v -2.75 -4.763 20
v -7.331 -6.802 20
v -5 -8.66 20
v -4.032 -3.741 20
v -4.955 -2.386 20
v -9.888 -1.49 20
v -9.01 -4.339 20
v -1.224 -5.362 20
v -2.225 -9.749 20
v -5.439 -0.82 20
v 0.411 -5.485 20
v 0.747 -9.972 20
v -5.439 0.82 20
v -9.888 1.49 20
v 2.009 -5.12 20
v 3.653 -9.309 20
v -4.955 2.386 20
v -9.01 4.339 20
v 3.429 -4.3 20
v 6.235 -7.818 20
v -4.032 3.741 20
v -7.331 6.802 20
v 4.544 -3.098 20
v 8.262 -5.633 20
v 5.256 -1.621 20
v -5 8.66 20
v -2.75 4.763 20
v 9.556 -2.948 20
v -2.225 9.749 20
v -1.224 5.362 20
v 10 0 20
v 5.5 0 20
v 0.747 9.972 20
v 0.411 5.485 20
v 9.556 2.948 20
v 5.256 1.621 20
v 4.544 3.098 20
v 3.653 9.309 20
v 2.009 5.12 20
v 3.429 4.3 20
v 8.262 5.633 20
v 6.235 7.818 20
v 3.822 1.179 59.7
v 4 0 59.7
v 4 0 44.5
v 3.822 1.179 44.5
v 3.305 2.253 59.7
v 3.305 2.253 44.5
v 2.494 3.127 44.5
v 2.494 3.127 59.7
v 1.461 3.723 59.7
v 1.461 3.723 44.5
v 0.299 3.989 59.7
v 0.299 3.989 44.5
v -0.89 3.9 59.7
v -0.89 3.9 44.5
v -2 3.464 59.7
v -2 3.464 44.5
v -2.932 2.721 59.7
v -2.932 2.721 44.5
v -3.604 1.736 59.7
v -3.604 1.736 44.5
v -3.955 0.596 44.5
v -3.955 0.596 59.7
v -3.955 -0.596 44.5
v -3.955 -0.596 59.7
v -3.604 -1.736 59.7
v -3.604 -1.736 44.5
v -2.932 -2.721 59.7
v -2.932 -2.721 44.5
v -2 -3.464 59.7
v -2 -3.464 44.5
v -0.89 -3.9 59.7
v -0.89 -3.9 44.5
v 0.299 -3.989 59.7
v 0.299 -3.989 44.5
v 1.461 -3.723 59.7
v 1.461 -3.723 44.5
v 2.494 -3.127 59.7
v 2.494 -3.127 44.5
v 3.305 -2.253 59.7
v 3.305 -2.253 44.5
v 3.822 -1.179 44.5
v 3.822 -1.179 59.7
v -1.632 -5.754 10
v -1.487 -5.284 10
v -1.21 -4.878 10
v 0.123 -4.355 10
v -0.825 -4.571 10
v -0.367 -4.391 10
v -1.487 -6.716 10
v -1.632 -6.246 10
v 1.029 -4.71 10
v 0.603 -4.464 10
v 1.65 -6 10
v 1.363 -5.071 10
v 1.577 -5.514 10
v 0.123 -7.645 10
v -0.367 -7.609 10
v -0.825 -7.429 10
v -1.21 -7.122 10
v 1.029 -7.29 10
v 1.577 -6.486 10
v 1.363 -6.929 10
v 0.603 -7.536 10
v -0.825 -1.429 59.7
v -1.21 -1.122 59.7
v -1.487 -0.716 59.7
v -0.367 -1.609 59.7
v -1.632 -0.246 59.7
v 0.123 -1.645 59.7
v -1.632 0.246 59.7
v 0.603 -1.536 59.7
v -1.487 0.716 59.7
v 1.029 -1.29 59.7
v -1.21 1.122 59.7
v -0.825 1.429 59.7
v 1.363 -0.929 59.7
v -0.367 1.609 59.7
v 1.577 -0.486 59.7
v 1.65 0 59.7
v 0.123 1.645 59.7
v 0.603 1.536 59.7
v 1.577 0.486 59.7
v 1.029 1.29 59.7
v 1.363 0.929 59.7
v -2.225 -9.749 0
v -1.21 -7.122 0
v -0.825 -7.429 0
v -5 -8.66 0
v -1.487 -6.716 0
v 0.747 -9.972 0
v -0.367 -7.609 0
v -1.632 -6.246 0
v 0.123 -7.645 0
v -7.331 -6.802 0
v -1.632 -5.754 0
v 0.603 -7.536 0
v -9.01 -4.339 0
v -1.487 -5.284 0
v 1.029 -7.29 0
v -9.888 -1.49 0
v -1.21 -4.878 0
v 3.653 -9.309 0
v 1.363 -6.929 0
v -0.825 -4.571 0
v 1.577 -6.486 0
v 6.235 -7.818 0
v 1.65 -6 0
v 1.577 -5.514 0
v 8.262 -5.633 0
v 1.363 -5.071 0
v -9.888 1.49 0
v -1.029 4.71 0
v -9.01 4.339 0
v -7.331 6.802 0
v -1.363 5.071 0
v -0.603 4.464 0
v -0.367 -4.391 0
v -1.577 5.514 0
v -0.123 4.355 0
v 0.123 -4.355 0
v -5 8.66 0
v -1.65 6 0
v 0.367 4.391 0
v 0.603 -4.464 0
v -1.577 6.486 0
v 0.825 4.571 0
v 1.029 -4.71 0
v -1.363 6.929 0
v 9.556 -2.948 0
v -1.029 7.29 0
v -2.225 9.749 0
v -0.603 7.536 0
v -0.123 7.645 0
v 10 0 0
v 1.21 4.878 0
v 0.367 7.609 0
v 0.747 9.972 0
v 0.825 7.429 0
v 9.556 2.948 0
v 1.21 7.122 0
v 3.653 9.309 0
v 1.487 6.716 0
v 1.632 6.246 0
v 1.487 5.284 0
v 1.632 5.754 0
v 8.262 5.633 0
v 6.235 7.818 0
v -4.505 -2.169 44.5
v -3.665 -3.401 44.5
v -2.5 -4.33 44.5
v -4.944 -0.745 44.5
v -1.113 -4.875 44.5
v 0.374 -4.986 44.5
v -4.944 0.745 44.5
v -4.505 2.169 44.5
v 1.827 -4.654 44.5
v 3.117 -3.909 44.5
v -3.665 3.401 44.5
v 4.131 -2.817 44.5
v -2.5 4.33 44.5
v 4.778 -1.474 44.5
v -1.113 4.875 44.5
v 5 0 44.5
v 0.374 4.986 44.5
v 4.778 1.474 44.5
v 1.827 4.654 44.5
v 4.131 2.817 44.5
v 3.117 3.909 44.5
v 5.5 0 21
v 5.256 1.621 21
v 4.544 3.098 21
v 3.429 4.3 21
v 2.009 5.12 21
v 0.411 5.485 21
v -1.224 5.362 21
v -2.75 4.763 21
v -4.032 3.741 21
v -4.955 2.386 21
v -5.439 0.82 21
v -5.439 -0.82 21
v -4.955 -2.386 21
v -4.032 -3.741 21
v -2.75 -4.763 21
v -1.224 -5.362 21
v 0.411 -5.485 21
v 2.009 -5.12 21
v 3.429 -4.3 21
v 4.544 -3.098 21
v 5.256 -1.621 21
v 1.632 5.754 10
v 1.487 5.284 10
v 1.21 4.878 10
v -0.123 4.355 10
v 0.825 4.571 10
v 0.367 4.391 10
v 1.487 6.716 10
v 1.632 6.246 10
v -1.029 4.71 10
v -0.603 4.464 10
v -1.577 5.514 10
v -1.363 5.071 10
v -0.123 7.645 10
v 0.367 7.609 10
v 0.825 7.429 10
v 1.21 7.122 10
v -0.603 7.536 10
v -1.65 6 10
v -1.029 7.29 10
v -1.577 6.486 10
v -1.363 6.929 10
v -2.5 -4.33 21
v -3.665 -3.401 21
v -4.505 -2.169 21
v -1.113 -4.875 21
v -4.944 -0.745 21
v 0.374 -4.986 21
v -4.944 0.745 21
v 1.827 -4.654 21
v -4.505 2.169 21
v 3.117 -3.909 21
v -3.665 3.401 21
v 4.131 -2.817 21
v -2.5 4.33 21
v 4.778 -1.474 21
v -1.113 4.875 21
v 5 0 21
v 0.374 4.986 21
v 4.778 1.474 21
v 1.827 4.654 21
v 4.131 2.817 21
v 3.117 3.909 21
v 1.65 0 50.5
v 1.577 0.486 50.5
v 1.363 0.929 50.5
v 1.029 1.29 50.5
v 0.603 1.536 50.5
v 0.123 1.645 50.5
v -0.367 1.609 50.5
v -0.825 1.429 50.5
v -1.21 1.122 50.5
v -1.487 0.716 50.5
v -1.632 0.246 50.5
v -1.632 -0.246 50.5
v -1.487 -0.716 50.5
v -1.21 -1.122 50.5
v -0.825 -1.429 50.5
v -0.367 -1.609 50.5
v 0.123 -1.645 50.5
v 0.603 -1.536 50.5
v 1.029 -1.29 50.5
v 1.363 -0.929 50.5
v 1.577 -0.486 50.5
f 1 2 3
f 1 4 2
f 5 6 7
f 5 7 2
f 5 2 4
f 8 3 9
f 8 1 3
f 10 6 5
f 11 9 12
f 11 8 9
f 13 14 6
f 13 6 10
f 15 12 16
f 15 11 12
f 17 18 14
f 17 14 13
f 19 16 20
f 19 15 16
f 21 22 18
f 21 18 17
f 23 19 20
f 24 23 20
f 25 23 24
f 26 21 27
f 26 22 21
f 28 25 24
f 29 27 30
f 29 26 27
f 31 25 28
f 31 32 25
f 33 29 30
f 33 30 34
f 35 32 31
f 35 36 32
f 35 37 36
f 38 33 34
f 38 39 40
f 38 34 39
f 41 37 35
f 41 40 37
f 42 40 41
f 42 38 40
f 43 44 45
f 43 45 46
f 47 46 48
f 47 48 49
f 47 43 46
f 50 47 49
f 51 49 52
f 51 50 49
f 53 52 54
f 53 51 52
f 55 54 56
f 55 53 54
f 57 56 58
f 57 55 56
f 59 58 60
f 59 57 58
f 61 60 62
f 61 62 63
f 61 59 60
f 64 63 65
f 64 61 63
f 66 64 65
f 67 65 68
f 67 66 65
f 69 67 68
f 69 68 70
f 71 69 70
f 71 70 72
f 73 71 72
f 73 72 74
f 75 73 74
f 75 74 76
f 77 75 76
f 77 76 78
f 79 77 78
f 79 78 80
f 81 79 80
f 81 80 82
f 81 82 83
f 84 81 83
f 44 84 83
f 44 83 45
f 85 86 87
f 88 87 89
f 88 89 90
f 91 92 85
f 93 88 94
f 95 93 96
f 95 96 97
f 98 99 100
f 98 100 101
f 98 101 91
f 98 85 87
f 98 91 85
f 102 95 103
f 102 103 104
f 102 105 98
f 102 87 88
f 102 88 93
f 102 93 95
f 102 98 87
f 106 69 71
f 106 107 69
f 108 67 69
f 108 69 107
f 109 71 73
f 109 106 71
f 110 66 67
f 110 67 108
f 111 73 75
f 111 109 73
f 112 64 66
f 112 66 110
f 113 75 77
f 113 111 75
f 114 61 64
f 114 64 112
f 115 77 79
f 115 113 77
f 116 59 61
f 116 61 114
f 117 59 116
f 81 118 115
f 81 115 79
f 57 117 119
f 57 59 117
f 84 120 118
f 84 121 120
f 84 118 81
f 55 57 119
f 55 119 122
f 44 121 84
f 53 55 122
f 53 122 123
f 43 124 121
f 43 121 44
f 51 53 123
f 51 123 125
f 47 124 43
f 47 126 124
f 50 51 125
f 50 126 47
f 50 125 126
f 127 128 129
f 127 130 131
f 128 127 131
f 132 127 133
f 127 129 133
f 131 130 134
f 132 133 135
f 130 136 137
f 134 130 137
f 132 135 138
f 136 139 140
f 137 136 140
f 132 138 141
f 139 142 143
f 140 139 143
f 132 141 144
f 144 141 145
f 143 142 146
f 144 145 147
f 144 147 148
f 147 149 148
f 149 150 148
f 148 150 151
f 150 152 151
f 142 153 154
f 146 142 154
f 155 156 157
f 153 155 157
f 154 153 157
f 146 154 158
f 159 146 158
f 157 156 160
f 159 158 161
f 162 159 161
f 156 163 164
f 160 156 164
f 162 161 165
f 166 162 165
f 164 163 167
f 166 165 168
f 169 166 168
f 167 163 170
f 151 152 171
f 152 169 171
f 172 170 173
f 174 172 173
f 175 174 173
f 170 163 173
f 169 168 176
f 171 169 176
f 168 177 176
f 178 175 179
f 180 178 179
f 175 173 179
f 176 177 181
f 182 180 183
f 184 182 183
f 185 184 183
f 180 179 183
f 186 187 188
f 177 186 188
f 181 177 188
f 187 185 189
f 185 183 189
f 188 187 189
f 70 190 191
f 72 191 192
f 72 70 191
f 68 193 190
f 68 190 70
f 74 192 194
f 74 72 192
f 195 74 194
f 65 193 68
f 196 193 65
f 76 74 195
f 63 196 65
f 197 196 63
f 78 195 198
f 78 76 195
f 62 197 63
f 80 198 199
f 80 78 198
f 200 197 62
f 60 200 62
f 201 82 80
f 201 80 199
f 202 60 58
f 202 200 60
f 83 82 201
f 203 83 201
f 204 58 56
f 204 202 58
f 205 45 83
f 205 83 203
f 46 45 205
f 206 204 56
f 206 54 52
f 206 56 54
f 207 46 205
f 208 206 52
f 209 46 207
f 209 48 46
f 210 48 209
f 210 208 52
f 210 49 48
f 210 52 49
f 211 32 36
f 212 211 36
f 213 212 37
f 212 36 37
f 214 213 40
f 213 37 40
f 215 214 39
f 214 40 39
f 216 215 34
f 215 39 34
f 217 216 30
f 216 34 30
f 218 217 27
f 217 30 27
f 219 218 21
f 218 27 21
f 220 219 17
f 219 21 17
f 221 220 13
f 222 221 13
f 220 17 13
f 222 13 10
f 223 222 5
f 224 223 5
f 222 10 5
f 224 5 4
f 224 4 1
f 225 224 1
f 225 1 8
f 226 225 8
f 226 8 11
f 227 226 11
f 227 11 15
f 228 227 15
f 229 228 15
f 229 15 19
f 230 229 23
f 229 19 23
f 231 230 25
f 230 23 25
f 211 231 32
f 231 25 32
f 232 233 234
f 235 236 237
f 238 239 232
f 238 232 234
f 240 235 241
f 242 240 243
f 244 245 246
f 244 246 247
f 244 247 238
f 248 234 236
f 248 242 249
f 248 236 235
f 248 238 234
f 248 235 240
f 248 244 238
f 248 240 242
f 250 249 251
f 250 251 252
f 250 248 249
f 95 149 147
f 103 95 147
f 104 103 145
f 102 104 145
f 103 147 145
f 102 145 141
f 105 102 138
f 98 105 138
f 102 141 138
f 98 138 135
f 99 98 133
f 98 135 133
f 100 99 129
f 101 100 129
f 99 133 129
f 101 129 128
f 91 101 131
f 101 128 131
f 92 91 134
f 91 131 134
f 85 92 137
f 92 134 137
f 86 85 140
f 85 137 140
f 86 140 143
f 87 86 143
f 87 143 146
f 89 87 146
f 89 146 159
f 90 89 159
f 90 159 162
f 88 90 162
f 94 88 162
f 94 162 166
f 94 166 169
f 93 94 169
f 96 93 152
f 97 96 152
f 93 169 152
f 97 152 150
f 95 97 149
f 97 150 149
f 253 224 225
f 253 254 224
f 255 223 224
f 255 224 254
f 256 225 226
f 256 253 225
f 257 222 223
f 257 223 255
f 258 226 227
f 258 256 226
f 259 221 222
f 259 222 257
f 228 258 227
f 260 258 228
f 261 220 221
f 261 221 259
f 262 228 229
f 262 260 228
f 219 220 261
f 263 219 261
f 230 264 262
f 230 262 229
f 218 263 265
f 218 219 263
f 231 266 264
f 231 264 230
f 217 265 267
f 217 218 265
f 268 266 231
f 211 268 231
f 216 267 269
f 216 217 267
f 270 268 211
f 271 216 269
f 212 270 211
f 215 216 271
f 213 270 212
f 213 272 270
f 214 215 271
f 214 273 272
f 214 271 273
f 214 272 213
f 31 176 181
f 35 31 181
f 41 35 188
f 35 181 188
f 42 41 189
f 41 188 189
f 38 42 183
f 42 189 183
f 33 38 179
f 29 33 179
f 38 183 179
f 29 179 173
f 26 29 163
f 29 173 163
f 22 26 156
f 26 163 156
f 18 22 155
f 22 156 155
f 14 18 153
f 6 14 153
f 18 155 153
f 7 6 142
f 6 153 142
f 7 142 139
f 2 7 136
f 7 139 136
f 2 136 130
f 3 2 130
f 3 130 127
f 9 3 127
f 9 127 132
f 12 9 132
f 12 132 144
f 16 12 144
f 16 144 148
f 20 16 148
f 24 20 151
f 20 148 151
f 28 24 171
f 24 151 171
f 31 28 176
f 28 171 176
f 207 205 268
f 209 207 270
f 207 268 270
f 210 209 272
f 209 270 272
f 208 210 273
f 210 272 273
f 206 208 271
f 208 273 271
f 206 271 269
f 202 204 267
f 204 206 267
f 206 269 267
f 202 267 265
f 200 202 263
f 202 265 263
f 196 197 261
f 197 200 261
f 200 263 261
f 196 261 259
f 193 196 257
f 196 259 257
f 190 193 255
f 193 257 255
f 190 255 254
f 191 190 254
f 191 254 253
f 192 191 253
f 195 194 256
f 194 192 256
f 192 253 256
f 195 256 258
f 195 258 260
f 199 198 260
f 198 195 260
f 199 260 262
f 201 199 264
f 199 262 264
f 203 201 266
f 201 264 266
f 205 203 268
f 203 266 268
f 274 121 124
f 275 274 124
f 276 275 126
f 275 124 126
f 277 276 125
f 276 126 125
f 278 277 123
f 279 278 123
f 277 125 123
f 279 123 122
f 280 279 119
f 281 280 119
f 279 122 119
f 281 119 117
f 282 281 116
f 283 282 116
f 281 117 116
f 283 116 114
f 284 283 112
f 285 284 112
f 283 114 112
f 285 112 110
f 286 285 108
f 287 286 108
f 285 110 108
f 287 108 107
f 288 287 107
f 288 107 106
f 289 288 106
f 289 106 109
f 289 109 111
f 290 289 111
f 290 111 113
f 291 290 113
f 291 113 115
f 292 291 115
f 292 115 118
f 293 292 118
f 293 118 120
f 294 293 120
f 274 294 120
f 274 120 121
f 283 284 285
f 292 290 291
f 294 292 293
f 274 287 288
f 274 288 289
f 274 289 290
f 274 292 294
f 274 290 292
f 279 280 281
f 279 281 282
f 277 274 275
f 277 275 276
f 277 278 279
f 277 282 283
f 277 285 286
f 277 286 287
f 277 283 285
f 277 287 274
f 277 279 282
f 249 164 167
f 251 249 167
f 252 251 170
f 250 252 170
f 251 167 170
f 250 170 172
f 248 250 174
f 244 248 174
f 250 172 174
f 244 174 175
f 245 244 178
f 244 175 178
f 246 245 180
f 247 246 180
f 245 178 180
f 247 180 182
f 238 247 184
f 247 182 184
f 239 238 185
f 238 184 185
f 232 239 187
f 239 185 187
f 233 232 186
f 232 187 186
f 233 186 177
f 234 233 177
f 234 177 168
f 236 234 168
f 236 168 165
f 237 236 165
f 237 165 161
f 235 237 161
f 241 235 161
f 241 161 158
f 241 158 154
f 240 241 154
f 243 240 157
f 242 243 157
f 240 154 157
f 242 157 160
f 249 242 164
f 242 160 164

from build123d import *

# Parameters (mm, degrees)
SKETCH_1_R          = 10
EXTRUDE_1_DEPTH     = 20
SKETCH_2_R          = 5
EXTRUDE_2_DEPTH     = 5
SKETCH_4_R          = 5.5
SKETCH_4_R_2        = 5
EXTRUDE_3_DEPTH     = 1
SKETCH_5_R          = 1.65
CUT_EXTRUDE_1_DEPTH = 10
SKETCH_6_R          = 5
EXTRUDE_4_DEPTH     = 35.5
SKETCH_7_OUTSIDE_W  = 35.358
SKETCH_7_OUTSIDE_H  = 35.358
SKETCH_7_OUTSIDE_R  = 4
CUT_EXTRUDE_2_DEPTH = 16
SKETCH_8_R          = 1.65
CUT_EXTRUDE_3_DEPTH = 10
SKETCH_9_R          = 4
CUT_EXTRUDE_4_DEPTH = 0.8


with BuildPart() as part:
    # ｽｹｯﾁ1 → ﾎﾞｽ - 押し出し1 (new body)
    with BuildSketch(Plane.XY):
        Circle(SKETCH_1_R)
    extrude(amount=EXTRUDE_1_DEPTH)

    # ｽｹｯﾁ2 → ﾎﾞｽ - 押し出し2 (add)
    with BuildSketch(Plane.XY.offset(20)):
        Circle(SKETCH_2_R)
    extrude(amount=EXTRUDE_2_DEPTH)

    # ｽｹｯﾁ4 → ﾎﾞｽ - 押し出し3 (add)
    with BuildSketch(Plane.XY.offset(20)):
        Circle(SKETCH_4_R)
        Circle(SKETCH_4_R_2, mode=Mode.SUBTRACT)
    extrude(amount=EXTRUDE_3_DEPTH)

    # ｽｹｯﾁ5 → ｶｯﾄ - 押し出し1 (cut)
    with BuildSketch(Plane(origin=(0, 0, 0), x_dir=(-1, 0, 0), z_dir=(0, 0, -1))):
        with Locations((0, 6)):
            Circle(SKETCH_5_R)
        with Locations(Location((0, -6, 0), (0, 0, 180))):
            Circle(SKETCH_5_R)
    extrude(amount=-CUT_EXTRUDE_1_DEPTH, mode=Mode.SUBTRACT)

    # ｽｹｯﾁ6 → ﾎﾞｽ - 押し出し4 (add)
    with BuildSketch(Plane.XY.offset(25)):
        Circle(SKETCH_6_R)
    extrude(amount=EXTRUDE_4_DEPTH)

    # ｽｹｯﾁ7 outside → ｶｯﾄ - 押し出し2 (cut)
    with BuildSketch(Plane.XY.offset(60.5)):
        Rectangle(SKETCH_7_OUTSIDE_W, SKETCH_7_OUTSIDE_H)
        Circle(SKETCH_7_OUTSIDE_R, mode=Mode.SUBTRACT)
    extrude(amount=-CUT_EXTRUDE_2_DEPTH, mode=Mode.SUBTRACT)

    # ｽｹｯﾁ8 → ｶｯﾄ - 押し出し3 (cut)
    with BuildSketch(Plane.XY.offset(60.5)):
        Circle(SKETCH_8_R)
    extrude(amount=-CUT_EXTRUDE_3_DEPTH, mode=Mode.SUBTRACT)

    # ｽｹｯﾁ9 → ｶｯﾄ - 押し出し4 (cut)
    with BuildSketch(Plane.XY.offset(60.5)):
        Circle(SKETCH_9_R)
    extrude(amount=-CUT_EXTRUDE_4_DEPTH, mode=Mode.SUBTRACT)


solid = part.part
